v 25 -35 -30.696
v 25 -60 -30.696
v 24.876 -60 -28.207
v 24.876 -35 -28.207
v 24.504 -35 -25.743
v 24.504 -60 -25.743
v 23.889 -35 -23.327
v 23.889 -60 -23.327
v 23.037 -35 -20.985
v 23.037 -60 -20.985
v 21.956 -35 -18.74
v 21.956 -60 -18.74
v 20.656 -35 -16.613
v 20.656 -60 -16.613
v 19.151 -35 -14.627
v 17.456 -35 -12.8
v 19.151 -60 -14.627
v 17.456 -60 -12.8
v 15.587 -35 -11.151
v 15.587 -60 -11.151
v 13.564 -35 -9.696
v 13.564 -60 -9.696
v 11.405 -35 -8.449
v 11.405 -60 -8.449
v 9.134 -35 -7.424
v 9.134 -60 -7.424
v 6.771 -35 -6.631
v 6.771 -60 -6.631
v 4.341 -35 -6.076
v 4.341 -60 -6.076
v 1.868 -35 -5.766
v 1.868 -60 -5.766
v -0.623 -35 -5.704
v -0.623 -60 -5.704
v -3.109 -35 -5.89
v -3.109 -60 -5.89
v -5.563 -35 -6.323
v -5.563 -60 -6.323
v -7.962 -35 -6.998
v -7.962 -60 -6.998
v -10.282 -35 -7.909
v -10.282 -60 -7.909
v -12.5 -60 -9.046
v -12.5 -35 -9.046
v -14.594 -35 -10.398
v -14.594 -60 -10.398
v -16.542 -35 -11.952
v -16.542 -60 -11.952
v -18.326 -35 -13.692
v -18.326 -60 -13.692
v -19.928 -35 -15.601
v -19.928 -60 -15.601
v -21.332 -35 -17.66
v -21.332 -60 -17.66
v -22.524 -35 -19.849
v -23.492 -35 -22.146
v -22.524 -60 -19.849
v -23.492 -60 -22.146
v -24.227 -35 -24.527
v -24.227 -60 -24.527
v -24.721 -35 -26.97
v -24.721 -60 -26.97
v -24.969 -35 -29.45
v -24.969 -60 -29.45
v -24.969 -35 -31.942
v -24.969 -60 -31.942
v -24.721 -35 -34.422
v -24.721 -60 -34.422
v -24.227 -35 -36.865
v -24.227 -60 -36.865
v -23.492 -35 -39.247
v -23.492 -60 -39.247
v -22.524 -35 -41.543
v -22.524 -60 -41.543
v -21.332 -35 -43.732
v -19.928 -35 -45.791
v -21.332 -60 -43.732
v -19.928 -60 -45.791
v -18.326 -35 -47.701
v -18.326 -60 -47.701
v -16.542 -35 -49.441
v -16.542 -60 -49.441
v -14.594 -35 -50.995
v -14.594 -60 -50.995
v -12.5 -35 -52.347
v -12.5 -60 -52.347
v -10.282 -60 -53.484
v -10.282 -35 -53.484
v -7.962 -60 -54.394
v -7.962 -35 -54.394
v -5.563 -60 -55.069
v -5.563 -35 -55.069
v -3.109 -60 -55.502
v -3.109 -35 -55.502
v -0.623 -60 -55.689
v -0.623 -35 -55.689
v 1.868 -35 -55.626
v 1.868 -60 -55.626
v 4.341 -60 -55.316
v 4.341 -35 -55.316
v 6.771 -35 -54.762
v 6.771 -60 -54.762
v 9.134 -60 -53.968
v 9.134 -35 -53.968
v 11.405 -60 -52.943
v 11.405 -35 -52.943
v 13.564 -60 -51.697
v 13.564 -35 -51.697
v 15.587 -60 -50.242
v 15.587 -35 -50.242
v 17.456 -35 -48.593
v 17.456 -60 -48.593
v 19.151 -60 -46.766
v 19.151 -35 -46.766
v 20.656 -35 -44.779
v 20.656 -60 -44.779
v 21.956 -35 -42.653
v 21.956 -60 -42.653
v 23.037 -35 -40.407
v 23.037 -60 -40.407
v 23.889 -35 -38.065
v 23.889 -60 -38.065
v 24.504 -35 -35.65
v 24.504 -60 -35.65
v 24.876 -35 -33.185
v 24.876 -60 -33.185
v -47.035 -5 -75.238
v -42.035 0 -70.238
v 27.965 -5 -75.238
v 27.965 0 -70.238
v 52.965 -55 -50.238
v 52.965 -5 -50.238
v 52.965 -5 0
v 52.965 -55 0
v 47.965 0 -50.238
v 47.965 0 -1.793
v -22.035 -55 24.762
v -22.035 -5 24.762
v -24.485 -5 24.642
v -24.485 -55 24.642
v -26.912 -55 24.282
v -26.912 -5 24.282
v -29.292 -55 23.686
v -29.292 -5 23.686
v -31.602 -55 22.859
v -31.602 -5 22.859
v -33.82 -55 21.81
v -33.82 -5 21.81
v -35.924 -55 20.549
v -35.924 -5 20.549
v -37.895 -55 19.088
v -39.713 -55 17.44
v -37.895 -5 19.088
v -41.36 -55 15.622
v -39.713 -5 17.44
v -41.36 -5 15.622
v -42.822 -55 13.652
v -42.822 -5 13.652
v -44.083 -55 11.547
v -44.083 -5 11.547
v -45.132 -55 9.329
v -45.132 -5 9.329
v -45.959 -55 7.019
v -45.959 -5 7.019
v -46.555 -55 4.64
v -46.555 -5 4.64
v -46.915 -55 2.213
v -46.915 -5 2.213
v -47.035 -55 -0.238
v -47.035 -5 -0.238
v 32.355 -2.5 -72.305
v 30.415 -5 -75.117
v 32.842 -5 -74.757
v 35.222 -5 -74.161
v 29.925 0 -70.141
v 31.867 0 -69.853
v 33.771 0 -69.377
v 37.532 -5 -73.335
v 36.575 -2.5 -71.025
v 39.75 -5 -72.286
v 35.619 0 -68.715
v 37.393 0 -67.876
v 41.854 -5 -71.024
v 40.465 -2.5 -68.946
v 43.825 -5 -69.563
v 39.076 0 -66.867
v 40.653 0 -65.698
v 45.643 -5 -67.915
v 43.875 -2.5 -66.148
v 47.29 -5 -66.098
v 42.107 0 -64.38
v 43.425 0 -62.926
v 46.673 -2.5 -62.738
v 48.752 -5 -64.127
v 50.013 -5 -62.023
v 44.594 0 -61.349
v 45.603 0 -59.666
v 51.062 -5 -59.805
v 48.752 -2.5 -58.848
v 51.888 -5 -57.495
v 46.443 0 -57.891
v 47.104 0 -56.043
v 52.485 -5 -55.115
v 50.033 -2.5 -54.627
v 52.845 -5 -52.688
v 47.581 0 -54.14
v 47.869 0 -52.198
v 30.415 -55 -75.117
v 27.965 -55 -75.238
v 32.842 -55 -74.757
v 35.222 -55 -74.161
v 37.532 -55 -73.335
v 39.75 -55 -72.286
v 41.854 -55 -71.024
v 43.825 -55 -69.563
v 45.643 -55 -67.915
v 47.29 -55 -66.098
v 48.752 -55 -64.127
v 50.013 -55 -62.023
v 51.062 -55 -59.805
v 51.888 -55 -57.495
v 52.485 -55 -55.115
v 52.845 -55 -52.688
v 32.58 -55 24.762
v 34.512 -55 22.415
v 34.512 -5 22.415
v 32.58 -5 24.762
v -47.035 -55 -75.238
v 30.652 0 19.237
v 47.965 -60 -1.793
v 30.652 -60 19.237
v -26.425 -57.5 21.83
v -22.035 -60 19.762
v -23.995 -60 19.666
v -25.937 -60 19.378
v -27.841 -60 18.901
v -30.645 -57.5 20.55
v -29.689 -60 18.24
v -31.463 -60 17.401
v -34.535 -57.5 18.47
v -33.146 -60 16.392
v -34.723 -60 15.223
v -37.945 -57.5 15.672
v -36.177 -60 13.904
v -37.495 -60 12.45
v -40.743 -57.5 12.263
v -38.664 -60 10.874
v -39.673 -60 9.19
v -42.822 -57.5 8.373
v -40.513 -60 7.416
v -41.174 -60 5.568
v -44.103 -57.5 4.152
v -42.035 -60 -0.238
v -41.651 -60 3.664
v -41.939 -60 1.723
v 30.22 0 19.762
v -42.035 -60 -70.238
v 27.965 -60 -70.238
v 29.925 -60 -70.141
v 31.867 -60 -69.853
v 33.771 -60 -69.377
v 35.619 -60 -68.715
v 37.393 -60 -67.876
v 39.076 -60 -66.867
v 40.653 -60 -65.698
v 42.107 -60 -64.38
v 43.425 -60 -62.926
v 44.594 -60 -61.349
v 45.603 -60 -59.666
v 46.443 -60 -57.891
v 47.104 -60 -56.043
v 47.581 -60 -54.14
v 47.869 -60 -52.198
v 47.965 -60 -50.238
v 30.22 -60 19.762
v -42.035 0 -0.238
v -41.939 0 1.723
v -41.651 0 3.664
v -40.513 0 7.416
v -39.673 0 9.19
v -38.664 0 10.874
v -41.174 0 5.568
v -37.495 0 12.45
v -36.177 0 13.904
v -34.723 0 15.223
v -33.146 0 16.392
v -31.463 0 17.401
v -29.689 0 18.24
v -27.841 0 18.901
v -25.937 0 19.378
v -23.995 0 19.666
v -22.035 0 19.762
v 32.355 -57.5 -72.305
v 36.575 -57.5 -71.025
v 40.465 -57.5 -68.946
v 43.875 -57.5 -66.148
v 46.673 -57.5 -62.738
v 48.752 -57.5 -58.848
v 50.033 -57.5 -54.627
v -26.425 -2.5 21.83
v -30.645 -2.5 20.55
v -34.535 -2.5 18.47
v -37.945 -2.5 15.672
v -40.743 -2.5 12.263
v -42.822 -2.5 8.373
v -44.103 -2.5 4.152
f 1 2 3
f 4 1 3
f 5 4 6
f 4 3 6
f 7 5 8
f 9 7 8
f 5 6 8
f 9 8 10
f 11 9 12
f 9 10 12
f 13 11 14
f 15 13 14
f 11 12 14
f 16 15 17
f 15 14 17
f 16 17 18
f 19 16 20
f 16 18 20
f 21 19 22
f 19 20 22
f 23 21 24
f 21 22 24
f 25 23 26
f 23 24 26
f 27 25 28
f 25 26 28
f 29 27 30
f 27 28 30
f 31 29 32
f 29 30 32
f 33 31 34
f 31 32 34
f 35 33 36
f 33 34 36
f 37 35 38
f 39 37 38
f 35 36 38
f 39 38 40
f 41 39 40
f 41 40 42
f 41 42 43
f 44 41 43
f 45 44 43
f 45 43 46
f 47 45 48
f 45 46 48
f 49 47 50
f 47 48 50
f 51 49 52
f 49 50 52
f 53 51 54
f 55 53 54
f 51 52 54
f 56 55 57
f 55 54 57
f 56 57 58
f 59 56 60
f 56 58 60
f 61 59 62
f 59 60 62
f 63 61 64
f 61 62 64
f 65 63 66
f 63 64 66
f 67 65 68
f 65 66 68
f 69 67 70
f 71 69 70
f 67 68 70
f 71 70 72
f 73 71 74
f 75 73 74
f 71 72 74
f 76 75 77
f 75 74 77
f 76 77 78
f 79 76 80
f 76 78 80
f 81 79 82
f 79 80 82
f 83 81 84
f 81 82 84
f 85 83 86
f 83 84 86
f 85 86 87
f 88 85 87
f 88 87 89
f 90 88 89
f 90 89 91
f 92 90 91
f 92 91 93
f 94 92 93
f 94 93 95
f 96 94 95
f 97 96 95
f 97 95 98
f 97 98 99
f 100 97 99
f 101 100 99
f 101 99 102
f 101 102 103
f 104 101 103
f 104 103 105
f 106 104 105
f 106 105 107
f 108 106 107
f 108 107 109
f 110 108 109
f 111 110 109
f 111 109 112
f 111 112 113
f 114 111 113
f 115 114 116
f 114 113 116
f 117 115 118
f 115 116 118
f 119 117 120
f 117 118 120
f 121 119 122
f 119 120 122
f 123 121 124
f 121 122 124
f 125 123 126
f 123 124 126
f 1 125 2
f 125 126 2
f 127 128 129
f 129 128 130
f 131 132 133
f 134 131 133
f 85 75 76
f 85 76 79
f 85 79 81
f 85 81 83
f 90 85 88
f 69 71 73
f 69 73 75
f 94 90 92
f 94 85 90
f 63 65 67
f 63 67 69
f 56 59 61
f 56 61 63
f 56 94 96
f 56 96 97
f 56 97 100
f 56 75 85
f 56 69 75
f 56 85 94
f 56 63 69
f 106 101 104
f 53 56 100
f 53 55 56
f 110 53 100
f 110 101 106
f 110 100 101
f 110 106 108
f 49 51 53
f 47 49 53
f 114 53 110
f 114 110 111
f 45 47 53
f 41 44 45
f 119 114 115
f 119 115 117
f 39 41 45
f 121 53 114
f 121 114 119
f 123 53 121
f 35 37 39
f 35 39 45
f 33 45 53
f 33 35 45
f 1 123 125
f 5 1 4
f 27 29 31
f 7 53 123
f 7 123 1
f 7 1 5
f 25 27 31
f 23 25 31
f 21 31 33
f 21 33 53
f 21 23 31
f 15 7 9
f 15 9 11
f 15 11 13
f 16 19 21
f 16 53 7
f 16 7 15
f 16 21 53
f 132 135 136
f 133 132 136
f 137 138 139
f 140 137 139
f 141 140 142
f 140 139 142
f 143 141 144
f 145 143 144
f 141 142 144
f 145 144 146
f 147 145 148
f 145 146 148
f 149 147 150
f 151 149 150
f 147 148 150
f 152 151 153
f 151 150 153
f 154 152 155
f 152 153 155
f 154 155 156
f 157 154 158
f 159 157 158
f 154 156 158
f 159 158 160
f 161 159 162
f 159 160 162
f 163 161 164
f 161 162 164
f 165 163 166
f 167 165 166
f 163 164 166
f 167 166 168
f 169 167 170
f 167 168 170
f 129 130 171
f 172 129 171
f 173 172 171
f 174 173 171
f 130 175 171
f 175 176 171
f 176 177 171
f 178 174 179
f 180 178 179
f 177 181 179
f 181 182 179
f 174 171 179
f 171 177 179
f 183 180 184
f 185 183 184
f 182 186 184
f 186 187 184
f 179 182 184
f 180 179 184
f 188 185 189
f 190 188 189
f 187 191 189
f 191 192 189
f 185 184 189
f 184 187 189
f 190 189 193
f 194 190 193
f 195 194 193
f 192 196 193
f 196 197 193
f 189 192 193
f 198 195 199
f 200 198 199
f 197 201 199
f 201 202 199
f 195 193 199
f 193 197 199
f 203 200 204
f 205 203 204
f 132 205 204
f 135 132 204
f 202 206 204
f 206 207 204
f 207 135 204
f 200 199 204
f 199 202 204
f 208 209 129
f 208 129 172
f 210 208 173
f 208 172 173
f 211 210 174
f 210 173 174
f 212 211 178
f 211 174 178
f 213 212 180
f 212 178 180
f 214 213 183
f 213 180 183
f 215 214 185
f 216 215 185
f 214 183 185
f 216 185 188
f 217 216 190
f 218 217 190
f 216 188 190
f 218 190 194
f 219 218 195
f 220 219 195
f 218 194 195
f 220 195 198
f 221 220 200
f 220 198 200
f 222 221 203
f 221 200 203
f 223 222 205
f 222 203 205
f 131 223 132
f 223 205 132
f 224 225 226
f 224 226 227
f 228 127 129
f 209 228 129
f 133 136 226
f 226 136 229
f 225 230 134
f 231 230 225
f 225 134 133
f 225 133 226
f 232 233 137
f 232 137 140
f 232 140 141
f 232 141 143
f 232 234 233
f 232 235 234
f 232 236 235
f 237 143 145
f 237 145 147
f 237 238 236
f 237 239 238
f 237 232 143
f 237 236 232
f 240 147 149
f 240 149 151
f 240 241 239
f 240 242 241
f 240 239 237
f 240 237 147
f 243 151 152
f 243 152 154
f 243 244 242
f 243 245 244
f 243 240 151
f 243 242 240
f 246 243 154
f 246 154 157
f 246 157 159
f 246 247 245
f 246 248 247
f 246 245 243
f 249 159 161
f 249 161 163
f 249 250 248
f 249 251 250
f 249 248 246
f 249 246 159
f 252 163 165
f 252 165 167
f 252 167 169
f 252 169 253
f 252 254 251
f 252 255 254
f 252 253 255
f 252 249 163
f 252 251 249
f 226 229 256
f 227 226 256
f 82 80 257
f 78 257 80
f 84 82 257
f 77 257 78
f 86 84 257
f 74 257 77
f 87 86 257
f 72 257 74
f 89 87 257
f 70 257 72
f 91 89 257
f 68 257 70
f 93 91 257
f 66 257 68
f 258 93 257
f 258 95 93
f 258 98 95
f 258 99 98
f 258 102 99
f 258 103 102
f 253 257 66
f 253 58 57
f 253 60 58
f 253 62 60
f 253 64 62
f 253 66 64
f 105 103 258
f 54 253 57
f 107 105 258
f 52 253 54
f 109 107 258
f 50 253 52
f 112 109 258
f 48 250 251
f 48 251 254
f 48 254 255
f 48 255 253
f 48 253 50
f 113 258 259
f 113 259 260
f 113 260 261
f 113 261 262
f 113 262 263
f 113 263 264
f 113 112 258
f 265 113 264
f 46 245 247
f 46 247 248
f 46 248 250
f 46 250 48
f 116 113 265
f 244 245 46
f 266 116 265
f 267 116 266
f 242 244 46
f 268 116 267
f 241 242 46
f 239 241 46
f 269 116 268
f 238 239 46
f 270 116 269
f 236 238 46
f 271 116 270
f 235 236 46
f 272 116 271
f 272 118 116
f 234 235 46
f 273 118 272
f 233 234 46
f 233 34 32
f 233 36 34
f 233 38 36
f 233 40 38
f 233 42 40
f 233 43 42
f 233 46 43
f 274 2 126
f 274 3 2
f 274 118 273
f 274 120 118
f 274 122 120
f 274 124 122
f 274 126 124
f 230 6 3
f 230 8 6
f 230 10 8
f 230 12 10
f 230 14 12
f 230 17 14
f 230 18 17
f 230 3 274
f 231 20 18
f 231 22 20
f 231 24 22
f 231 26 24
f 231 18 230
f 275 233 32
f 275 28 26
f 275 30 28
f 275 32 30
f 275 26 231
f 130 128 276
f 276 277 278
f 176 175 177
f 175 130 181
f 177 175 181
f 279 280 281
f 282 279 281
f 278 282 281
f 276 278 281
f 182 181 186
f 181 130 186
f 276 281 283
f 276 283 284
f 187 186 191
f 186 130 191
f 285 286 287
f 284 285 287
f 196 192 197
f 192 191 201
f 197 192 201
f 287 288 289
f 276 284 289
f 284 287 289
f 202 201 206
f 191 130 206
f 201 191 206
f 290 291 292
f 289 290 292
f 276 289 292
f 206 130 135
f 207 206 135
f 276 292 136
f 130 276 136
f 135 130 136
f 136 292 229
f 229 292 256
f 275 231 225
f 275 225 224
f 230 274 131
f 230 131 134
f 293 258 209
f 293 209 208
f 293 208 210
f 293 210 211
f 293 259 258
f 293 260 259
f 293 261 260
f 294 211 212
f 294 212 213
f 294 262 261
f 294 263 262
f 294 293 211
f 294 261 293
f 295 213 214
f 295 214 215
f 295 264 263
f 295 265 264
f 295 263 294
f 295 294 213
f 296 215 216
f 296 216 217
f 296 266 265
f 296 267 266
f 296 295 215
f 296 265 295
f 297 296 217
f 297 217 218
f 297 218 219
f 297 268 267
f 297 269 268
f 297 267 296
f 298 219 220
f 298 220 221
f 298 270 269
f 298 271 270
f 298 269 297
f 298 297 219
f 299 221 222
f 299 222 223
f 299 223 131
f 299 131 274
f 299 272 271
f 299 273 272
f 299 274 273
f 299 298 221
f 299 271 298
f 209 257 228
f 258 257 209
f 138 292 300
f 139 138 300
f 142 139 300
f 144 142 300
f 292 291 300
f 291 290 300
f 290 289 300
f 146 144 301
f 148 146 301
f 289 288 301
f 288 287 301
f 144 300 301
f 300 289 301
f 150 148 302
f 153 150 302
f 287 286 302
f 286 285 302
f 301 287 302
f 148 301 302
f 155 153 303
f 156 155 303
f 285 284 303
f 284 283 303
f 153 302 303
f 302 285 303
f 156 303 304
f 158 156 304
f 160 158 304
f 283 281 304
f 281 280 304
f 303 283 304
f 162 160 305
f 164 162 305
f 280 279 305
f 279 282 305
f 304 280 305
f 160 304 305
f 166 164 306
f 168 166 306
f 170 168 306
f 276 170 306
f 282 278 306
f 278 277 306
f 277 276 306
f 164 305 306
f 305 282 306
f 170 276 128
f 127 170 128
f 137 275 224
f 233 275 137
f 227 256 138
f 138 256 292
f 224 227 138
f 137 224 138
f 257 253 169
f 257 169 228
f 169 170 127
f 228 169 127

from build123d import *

# Parameters (mm, degrees)
F1_DEPTH = 60
F2_SIZE  = 5
F3_R     = 25
F4_DEPTH = 25


with BuildPart() as f1:
    # F0 (on Front) → F1 (new body)
    with BuildSketch(Plane.XZ):
        with BuildLine():
            Line((32.580328, 24.762304), (-22.035015, 24.762304))
            ThreePointArc((-22.035015, 24.762304), (-39.712685, 17.439974), (-47.035015, -0.237696))
            Line((-47.035015, -0.237696), (-47.035015, -75.237696))
            Line((-47.035015, -75.237696), (27.964985, -75.237696))
            ThreePointArc((27.964985, -75.237696), (45.642654, -67.915365), (52.964985, -50.237696))
            Line((52.964985, -50.237696), (52.964985, 0))
            Line((52.964985, 0), (34.512423, 22.415288))
            Line((34.512423, 22.415288), (32.580328, 24.762304))
        make_face()
    extrude(amount=F1_DEPTH)

    # F2
    f2_edges = [f1.edges().sort_by_distance(p)[0] for p in [
        (-39.712685, -60, 17.439974),
        (5.272656, -60, 24.762304),
        (42.772656, -60, 12.381152),
        (52.964985, -60, -25.118848),
        (45.642654, -60, -67.915365),
        (-9.535015, -60, -75.237696),
        (-47.035015, -60, -37.737696),
        (-39.712685, 0, 17.439974),
        (5.272656, 0, 24.762304),
        (42.772656, 0, 12.381152),
        (45.642654, 0, -67.915365),
        (-9.535015, 0, -75.237696),
    ]]
    chamfer(f2_edges, length=F2_SIZE)

    # F3 (on face) → F4 (cut)
    with BuildSketch(Plane.XZ.offset(60)):
        with Locations((0, -30.696294)):
            Circle(F3_R)
    extrude(amount=-F4_DEPTH, mode=Mode.SUBTRACT)


solid = f1.part
